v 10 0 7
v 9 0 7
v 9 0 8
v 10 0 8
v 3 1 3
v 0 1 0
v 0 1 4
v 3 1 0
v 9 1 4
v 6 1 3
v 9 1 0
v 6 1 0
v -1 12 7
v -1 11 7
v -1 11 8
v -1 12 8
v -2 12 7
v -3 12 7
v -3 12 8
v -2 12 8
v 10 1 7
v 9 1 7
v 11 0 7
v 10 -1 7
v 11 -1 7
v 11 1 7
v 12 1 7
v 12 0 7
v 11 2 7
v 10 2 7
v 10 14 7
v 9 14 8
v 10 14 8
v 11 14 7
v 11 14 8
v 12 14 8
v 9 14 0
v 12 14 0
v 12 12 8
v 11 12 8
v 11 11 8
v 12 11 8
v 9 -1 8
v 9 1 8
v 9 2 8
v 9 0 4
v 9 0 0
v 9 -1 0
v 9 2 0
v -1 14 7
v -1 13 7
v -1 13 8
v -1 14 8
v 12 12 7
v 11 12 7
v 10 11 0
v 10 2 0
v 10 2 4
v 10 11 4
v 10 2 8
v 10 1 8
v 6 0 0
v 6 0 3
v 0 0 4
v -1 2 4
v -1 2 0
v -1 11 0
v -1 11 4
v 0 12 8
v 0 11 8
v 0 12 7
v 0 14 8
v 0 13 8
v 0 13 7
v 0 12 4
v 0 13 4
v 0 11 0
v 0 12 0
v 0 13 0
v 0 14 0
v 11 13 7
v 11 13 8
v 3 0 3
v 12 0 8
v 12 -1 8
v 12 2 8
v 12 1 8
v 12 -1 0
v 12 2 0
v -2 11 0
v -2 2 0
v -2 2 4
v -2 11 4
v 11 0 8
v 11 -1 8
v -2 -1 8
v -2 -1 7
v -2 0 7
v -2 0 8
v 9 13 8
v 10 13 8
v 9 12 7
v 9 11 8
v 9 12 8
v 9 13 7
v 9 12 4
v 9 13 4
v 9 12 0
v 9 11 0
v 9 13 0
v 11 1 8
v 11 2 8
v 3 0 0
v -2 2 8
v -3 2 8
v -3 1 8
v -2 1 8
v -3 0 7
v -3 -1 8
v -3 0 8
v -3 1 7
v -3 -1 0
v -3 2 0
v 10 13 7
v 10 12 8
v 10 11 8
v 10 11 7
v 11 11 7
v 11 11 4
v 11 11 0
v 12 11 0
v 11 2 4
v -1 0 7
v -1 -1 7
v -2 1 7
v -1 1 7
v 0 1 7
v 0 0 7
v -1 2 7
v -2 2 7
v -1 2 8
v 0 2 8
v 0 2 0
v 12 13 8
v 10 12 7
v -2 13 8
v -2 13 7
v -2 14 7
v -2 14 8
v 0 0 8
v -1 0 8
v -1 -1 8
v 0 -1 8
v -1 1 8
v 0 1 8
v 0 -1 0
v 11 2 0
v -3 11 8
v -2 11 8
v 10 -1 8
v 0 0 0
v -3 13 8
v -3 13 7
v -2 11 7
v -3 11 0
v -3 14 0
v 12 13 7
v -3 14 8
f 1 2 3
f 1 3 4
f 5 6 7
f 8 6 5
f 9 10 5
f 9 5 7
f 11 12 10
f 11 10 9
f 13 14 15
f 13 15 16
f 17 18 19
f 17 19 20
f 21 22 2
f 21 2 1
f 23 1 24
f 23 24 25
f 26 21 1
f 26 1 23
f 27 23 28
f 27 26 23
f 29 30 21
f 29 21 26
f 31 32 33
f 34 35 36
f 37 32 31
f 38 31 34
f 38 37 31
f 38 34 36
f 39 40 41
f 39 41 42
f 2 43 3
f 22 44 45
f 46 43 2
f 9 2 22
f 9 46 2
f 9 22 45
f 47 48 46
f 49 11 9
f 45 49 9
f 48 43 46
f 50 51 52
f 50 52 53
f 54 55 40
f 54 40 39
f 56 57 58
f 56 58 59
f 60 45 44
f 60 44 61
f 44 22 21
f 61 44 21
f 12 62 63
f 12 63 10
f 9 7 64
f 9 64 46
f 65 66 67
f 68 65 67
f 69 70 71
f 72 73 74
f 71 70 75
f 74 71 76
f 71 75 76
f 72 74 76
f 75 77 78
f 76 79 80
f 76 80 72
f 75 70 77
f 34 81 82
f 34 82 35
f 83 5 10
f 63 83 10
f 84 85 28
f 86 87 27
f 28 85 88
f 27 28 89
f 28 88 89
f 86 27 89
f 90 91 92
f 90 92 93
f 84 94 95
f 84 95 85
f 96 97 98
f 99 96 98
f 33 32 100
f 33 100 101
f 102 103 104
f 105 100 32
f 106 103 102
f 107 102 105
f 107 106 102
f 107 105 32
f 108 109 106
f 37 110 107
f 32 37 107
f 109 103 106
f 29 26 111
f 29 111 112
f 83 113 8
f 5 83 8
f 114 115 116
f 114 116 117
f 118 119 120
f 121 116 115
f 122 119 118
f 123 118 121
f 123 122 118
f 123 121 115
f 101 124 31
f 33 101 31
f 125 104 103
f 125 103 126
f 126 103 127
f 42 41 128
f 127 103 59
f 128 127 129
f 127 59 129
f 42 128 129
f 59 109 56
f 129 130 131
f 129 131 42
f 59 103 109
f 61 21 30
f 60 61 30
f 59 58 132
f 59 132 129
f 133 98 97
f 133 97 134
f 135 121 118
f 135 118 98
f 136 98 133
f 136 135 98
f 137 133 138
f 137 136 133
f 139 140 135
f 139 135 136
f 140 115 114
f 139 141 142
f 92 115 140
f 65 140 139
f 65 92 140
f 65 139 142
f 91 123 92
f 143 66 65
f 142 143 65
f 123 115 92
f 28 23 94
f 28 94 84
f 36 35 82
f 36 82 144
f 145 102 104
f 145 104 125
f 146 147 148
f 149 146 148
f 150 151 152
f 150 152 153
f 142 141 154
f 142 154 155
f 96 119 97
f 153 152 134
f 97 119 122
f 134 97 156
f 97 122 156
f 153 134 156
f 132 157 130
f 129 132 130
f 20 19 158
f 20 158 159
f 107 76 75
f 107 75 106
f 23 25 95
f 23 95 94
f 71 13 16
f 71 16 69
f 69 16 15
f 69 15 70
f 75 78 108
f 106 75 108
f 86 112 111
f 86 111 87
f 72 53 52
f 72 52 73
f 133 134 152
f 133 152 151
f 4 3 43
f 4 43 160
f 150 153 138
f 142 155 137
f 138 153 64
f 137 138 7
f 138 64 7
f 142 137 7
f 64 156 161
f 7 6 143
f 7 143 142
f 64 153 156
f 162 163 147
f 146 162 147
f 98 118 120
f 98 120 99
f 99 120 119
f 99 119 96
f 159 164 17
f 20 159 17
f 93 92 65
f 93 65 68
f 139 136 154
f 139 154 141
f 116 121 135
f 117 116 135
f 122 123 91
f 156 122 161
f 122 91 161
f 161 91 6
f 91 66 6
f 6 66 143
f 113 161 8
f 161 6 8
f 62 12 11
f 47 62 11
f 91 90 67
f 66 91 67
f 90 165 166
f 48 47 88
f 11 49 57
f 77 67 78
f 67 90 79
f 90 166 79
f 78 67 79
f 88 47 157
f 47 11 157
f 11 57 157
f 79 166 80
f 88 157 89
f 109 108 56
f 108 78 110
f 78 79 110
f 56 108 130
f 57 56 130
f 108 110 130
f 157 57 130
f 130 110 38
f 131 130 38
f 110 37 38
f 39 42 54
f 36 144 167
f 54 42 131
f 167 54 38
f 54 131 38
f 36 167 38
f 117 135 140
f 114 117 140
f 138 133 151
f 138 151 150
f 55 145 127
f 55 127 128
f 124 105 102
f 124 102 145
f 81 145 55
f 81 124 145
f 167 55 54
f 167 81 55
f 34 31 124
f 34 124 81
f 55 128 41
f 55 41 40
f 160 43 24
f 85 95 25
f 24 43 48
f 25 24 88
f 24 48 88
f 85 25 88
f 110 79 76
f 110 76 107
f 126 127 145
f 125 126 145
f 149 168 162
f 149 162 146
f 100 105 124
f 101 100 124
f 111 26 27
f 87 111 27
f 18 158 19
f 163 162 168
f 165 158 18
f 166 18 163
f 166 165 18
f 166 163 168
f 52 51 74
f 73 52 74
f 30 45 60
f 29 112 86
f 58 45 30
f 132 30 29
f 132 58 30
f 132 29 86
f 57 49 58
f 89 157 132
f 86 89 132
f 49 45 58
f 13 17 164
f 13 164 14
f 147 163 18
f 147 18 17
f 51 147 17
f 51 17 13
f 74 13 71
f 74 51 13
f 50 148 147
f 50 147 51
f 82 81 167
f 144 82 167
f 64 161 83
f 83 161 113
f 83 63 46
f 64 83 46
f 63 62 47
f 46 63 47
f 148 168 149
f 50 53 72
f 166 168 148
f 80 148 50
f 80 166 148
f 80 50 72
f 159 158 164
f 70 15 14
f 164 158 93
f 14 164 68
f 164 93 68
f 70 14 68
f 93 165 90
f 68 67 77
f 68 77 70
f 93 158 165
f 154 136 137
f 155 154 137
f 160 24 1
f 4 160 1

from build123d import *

# Parameters (mm, degrees)
BOX015_W     = 1
BOX015_H     = 1
BOX015_DEPTH = 1
BOX016_W     = 1
BOX016_H     = 1
BOX016_DEPTH = 1
BOX018_W     = 1
BOX018_H     = 1
BOX018_DEPTH = 1
BOX017_W     = 1
BOX017_H     = 1
BOX017_DEPTH = 1
BOX014_W     = 3
BOX014_H     = 3
BOX014_DEPTH = 7
BOX024_W     = 9
BOX024_H     = 1
BOX024_DEPTH = 4
BOX020_W     = 1
BOX020_H     = 1
BOX020_DEPTH = 1
BOX021_W     = 1
BOX021_H     = 1
BOX021_DEPTH = 1
BOX023_W     = 1
BOX023_H     = 1
BOX023_DEPTH = 1
BOX022_W     = 1
BOX022_H     = 1
BOX022_DEPTH = 1
BOX019_W     = 3
BOX019_H     = 3
BOX019_DEPTH = 7
BOX003_W     = 9
BOX003_H     = 1
BOX003_DEPTH = 4
BOX004_W     = 9
BOX004_H     = 1
BOX004_DEPTH = 4
BOX010_W     = 1
BOX010_H     = 1
BOX010_DEPTH = 1
BOX011_W     = 1
BOX011_H     = 1
BOX011_DEPTH = 1
BOX013_W     = 1
BOX013_H     = 1
BOX013_DEPTH = 1
BOX012_W     = 1
BOX012_H     = 1
BOX012_DEPTH = 1
BOX009_W     = 3
BOX009_H     = 3
BOX009_DEPTH = 7
BOX005_W     = 1
BOX005_H     = 1
BOX005_DEPTH = 1
BOX006_W     = 1
BOX006_H     = 1
BOX006_DEPTH = 1
BOX008_W     = 1
BOX008_H     = 1
BOX008_DEPTH = 1
BOX007_W     = 1
BOX007_H     = 1
BOX007_DEPTH = 1
BOX001_W     = 3
BOX001_H     = 3
BOX001_DEPTH = 7
BOX025_W     = 3
BOX025_H     = 1
BOX025_DEPTH = 3
BOX_W        = 9
BOX_H        = 1
BOX_DEPTH    = 4


with BuildPart() as cubo015:
    # Box015 → Box015 (new body)
    with BuildSketch(Plane(origin=(-1, 1, 7), x_dir=(1, 0, 0), z_dir=(0, 0, 1))):
        with Locations((0.5, 0.5)):
            Rectangle(BOX015_W, BOX015_H)
    extrude(amount=BOX015_DEPTH)


with BuildPart() as cubo016:
    # Box016 → Box016 (new body)
    with BuildSketch(Plane(origin=(-1, -1, 7), x_dir=(1, 0, 0), z_dir=(0, 0, 1))):
        with Locations((0.5, 0.5)):
            Rectangle(BOX016_W, BOX016_H)
    extrude(amount=BOX016_DEPTH)


with BuildPart() as cubo018:
    # Box018 → Box018 (new body)
    with BuildSketch(Plane(origin=(-3, 1, 7), x_dir=(1, 0, 0), z_dir=(0, 0, 1))):
        with Locations((0.5, 0.5)):
            Rectangle(BOX018_W, BOX018_H)
    extrude(amount=BOX018_DEPTH)


with BuildPart() as cubo017:
    # Box017 → Box017 (new body)
    with BuildSketch(Plane(origin=(-3, -1, 7), x_dir=(1, 0, 0), z_dir=(0, 0, 1))):
        with Locations((0.5, 0.5)):
            Rectangle(BOX017_W, BOX017_H)
    extrude(amount=BOX017_DEPTH)


with BuildPart() as fusion011:
    # Box014 → Box014 (new body)
    with BuildSketch(Plane(origin=(-3, -1, 0), x_dir=(1, 0, 0), z_dir=(0, 0, 1))):
        with Locations((1.5, 1.5)):
            Rectangle(BOX014_W, BOX014_H)
    extrude(amount=BOX014_DEPTH)

    # Fusion008: union Cubo017
    add(cubo017.part)

    # Fusion009: union Cubo018
    add(cubo018.part)

    # Fusion010: union Cubo016
    add(cubo016.part)

    # Fusion011: union Cubo015
    add(cubo015.part)


with BuildPart() as fusion011_1:
    # Fusion011 placement: moved
    add(fusion011.part.moved(Location((12, 12, 0))))


with BuildPart() as cubo024:
    # Box024 → Box024 (new body)
    with BuildSketch(Plane(origin=(0, 12, 0), x_dir=(1, 0, 0), z_dir=(0, 0, 1))):
        with Locations((4.5, 0.5)):
            Rectangle(BOX024_W, BOX024_H)
    extrude(amount=BOX024_DEPTH)


with BuildPart() as cubo020:
    # Box020 → Box020 (new body)
    with BuildSketch(Plane(origin=(-1, 1, 7), x_dir=(1, 0, 0), z_dir=(0, 0, 1))):
        with Locations((0.5, 0.5)):
            Rectangle(BOX020_W, BOX020_H)
    extrude(amount=BOX020_DEPTH)


with BuildPart() as cubo021:
    # Box021 → Box021 (new body)
    with BuildSketch(Plane(origin=(-1, -1, 7), x_dir=(1, 0, 0), z_dir=(0, 0, 1))):
        with Locations((0.5, 0.5)):
            Rectangle(BOX021_W, BOX021_H)
    extrude(amount=BOX021_DEPTH)


with BuildPart() as cubo023:
    # Box023 → Box023 (new body)
    with BuildSketch(Plane(origin=(-3, 1, 7), x_dir=(1, 0, 0), z_dir=(0, 0, 1))):
        with Locations((0.5, 0.5)):
            Rectangle(BOX023_W, BOX023_H)
    extrude(amount=BOX023_DEPTH)


with BuildPart() as cubo022:
    # Box022 → Box022 (new body)
    with BuildSketch(Plane(origin=(-3, -1, 7), x_dir=(1, 0, 0), z_dir=(0, 0, 1))):
        with Locations((0.5, 0.5)):
            Rectangle(BOX022_W, BOX022_H)
    extrude(amount=BOX022_DEPTH)


with BuildPart() as fusion015:
    # Box019 → Box019 (new body)
    with BuildSketch(Plane(origin=(-3, -1, 0), x_dir=(1, 0, 0), z_dir=(0, 0, 1))):
        with Locations((1.5, 1.5)):
            Rectangle(BOX019_W, BOX019_H)
    extrude(amount=BOX019_DEPTH)

    # Fusion012: union Cubo022
    add(cubo022.part)

    # Fusion013: union Cubo023
    add(cubo023.part)

    # Fusion014: union Cubo021
    add(cubo021.part)

    # Fusion015: union Cubo020
    add(cubo020.part)


with BuildPart() as fusion015_1:
    # Fusion015 placement: moved
    add(fusion015.part.moved(Location((0, 12, 0))))


with BuildPart() as cubo003:
    # Box003 → Box003 (new body)
    with BuildSketch(Plane(origin=(-1, 2, 0), x_dir=(0, 1, 0), z_dir=(0, 0, 1))):
        with Locations((4.5, 0.5)):
            Rectangle(BOX003_W, BOX003_H)
    extrude(amount=BOX003_DEPTH)


with BuildPart() as cubo004:
    # Box004 → Box004 (new body)
    with BuildSketch(Plane(origin=(11, 2, 0), x_dir=(0, 1, 0), z_dir=(0, 0, 1))):
        with Locations((4.5, 0.5)):
            Rectangle(BOX004_W, BOX004_H)
    extrude(amount=BOX004_DEPTH)


with BuildPart() as cubo010:
    # Box010 → Box010 (new body)
    with BuildSketch(Plane(origin=(-1, 1, 7), x_dir=(1, 0, 0), z_dir=(0, 0, 1))):
        with Locations((0.5, 0.5)):
            Rectangle(BOX010_W, BOX010_H)
    extrude(amount=BOX010_DEPTH)


with BuildPart() as cubo011:
    # Box011 → Box011 (new body)
    with BuildSketch(Plane(origin=(-1, -1, 7), x_dir=(1, 0, 0), z_dir=(0, 0, 1))):
        with Locations((0.5, 0.5)):
            Rectangle(BOX011_W, BOX011_H)
    extrude(amount=BOX011_DEPTH)


with BuildPart() as cubo013:
    # Box013 → Box013 (new body)
    with BuildSketch(Plane(origin=(-3, 1, 7), x_dir=(1, 0, 0), z_dir=(0, 0, 1))):
        with Locations((0.5, 0.5)):
            Rectangle(BOX013_W, BOX013_H)
    extrude(amount=BOX013_DEPTH)


with BuildPart() as cubo012:
    # Box012 → Box012 (new body)
    with BuildSketch(Plane(origin=(-3, -1, 7), x_dir=(1, 0, 0), z_dir=(0, 0, 1))):
        with Locations((0.5, 0.5)):
            Rectangle(BOX012_W, BOX012_H)
    extrude(amount=BOX012_DEPTH)


with BuildPart() as fusion007:
    # Box009 → Box009 (new body)
    with BuildSketch(Plane(origin=(-3, -1, 0), x_dir=(1, 0, 0), z_dir=(0, 0, 1))):
        with Locations((1.5, 1.5)):
            Rectangle(BOX009_W, BOX009_H)
    extrude(amount=BOX009_DEPTH)

    # Fusion004: union Cubo012
    add(cubo012.part)

    # Fusion005: union Cubo013
    add(cubo013.part)

    # Fusion006: union Cubo011
    add(cubo011.part)

    # Fusion007: union Cubo010
    add(cubo010.part)


with BuildPart() as fusion007_1:
    # Fusion007 placement: moved
    add(fusion007.part.moved(Location((12, 0, 0))))


with BuildPart() as cubo005:
    # Box005 → Box005 (new body)
    with BuildSketch(Plane(origin=(-1, 1, 7), x_dir=(1, 0, 0), z_dir=(0, 0, 1))):
        with Locations((0.5, 0.5)):
            Rectangle(BOX005_W, BOX005_H)
    extrude(amount=BOX005_DEPTH)


with BuildPart() as cubo006:
    # Box006 → Box006 (new body)
    with BuildSketch(Plane(origin=(-1, -1, 7), x_dir=(1, 0, 0), z_dir=(0, 0, 1))):
        with Locations((0.5, 0.5)):
            Rectangle(BOX006_W, BOX006_H)
    extrude(amount=BOX006_DEPTH)


with BuildPart() as cubo008:
    # Box008 → Box008 (new body)
    with BuildSketch(Plane(origin=(-3, 1, 7), x_dir=(1, 0, 0), z_dir=(0, 0, 1))):
        with Locations((0.5, 0.5)):
            Rectangle(BOX008_W, BOX008_H)
    extrude(amount=BOX008_DEPTH)


with BuildPart() as cubo007:
    # Box007 → Box007 (new body)
    with BuildSketch(Plane(origin=(-3, -1, 7), x_dir=(1, 0, 0), z_dir=(0, 0, 1))):
        with Locations((0.5, 0.5)):
            Rectangle(BOX007_W, BOX007_H)
    extrude(amount=BOX007_DEPTH)


with BuildPart() as fusion003:
    # Box001 → Box001 (new body)
    with BuildSketch(Plane(origin=(-3, -1, 0), x_dir=(1, 0, 0), z_dir=(0, 0, 1))):
        with Locations((1.5, 1.5)):
            Rectangle(BOX001_W, BOX001_H)
    extrude(amount=BOX001_DEPTH)

    # Fusion: union Cubo007
    add(cubo007.part)

    # Fusion001: union Cubo008
    add(cubo008.part)

    # Fusion002: union Cubo006
    add(cubo006.part)

    # Fusion003: union Cubo005
    add(cubo005.part)


with BuildPart() as cubo025:
    # Box025 → Box025 (new body)
    with BuildSketch(Plane(origin=(3, 0, 0), x_dir=(1, 0, 0), z_dir=(0, 0, 1))):
        with Locations((1.5, 0.5)):
            Rectangle(BOX025_W, BOX025_H)
    extrude(amount=BOX025_DEPTH)


with BuildPart() as fusion022:
    # Box → Box (new body)
    with BuildSketch(Plane.XY):
        with Locations((4.5, 0.5)):
            Rectangle(BOX_W, BOX_H)
    extrude(amount=BOX_DEPTH)

    # Cut: cut Cubo025
    add(cubo025.part, mode=Mode.SUBTRACT)

    # Fusion016: union Fusion003
    add(fusion003.part)

    # Fusion017: union Fusion007
    add(fusion007_1.part)

    # Fusion018: union Cubo004
    add(cubo004.part)

    # Fusion019: union Cubo003
    add(cubo003.part)

    # Fusion020: union Fusion015
    add(fusion015_1.part)

    # Fusion021: union Cubo024
    add(cubo024.part)

    # Fusion022: union Fusion011
    add(fusion011_1.part)


solid = fusion022.part
